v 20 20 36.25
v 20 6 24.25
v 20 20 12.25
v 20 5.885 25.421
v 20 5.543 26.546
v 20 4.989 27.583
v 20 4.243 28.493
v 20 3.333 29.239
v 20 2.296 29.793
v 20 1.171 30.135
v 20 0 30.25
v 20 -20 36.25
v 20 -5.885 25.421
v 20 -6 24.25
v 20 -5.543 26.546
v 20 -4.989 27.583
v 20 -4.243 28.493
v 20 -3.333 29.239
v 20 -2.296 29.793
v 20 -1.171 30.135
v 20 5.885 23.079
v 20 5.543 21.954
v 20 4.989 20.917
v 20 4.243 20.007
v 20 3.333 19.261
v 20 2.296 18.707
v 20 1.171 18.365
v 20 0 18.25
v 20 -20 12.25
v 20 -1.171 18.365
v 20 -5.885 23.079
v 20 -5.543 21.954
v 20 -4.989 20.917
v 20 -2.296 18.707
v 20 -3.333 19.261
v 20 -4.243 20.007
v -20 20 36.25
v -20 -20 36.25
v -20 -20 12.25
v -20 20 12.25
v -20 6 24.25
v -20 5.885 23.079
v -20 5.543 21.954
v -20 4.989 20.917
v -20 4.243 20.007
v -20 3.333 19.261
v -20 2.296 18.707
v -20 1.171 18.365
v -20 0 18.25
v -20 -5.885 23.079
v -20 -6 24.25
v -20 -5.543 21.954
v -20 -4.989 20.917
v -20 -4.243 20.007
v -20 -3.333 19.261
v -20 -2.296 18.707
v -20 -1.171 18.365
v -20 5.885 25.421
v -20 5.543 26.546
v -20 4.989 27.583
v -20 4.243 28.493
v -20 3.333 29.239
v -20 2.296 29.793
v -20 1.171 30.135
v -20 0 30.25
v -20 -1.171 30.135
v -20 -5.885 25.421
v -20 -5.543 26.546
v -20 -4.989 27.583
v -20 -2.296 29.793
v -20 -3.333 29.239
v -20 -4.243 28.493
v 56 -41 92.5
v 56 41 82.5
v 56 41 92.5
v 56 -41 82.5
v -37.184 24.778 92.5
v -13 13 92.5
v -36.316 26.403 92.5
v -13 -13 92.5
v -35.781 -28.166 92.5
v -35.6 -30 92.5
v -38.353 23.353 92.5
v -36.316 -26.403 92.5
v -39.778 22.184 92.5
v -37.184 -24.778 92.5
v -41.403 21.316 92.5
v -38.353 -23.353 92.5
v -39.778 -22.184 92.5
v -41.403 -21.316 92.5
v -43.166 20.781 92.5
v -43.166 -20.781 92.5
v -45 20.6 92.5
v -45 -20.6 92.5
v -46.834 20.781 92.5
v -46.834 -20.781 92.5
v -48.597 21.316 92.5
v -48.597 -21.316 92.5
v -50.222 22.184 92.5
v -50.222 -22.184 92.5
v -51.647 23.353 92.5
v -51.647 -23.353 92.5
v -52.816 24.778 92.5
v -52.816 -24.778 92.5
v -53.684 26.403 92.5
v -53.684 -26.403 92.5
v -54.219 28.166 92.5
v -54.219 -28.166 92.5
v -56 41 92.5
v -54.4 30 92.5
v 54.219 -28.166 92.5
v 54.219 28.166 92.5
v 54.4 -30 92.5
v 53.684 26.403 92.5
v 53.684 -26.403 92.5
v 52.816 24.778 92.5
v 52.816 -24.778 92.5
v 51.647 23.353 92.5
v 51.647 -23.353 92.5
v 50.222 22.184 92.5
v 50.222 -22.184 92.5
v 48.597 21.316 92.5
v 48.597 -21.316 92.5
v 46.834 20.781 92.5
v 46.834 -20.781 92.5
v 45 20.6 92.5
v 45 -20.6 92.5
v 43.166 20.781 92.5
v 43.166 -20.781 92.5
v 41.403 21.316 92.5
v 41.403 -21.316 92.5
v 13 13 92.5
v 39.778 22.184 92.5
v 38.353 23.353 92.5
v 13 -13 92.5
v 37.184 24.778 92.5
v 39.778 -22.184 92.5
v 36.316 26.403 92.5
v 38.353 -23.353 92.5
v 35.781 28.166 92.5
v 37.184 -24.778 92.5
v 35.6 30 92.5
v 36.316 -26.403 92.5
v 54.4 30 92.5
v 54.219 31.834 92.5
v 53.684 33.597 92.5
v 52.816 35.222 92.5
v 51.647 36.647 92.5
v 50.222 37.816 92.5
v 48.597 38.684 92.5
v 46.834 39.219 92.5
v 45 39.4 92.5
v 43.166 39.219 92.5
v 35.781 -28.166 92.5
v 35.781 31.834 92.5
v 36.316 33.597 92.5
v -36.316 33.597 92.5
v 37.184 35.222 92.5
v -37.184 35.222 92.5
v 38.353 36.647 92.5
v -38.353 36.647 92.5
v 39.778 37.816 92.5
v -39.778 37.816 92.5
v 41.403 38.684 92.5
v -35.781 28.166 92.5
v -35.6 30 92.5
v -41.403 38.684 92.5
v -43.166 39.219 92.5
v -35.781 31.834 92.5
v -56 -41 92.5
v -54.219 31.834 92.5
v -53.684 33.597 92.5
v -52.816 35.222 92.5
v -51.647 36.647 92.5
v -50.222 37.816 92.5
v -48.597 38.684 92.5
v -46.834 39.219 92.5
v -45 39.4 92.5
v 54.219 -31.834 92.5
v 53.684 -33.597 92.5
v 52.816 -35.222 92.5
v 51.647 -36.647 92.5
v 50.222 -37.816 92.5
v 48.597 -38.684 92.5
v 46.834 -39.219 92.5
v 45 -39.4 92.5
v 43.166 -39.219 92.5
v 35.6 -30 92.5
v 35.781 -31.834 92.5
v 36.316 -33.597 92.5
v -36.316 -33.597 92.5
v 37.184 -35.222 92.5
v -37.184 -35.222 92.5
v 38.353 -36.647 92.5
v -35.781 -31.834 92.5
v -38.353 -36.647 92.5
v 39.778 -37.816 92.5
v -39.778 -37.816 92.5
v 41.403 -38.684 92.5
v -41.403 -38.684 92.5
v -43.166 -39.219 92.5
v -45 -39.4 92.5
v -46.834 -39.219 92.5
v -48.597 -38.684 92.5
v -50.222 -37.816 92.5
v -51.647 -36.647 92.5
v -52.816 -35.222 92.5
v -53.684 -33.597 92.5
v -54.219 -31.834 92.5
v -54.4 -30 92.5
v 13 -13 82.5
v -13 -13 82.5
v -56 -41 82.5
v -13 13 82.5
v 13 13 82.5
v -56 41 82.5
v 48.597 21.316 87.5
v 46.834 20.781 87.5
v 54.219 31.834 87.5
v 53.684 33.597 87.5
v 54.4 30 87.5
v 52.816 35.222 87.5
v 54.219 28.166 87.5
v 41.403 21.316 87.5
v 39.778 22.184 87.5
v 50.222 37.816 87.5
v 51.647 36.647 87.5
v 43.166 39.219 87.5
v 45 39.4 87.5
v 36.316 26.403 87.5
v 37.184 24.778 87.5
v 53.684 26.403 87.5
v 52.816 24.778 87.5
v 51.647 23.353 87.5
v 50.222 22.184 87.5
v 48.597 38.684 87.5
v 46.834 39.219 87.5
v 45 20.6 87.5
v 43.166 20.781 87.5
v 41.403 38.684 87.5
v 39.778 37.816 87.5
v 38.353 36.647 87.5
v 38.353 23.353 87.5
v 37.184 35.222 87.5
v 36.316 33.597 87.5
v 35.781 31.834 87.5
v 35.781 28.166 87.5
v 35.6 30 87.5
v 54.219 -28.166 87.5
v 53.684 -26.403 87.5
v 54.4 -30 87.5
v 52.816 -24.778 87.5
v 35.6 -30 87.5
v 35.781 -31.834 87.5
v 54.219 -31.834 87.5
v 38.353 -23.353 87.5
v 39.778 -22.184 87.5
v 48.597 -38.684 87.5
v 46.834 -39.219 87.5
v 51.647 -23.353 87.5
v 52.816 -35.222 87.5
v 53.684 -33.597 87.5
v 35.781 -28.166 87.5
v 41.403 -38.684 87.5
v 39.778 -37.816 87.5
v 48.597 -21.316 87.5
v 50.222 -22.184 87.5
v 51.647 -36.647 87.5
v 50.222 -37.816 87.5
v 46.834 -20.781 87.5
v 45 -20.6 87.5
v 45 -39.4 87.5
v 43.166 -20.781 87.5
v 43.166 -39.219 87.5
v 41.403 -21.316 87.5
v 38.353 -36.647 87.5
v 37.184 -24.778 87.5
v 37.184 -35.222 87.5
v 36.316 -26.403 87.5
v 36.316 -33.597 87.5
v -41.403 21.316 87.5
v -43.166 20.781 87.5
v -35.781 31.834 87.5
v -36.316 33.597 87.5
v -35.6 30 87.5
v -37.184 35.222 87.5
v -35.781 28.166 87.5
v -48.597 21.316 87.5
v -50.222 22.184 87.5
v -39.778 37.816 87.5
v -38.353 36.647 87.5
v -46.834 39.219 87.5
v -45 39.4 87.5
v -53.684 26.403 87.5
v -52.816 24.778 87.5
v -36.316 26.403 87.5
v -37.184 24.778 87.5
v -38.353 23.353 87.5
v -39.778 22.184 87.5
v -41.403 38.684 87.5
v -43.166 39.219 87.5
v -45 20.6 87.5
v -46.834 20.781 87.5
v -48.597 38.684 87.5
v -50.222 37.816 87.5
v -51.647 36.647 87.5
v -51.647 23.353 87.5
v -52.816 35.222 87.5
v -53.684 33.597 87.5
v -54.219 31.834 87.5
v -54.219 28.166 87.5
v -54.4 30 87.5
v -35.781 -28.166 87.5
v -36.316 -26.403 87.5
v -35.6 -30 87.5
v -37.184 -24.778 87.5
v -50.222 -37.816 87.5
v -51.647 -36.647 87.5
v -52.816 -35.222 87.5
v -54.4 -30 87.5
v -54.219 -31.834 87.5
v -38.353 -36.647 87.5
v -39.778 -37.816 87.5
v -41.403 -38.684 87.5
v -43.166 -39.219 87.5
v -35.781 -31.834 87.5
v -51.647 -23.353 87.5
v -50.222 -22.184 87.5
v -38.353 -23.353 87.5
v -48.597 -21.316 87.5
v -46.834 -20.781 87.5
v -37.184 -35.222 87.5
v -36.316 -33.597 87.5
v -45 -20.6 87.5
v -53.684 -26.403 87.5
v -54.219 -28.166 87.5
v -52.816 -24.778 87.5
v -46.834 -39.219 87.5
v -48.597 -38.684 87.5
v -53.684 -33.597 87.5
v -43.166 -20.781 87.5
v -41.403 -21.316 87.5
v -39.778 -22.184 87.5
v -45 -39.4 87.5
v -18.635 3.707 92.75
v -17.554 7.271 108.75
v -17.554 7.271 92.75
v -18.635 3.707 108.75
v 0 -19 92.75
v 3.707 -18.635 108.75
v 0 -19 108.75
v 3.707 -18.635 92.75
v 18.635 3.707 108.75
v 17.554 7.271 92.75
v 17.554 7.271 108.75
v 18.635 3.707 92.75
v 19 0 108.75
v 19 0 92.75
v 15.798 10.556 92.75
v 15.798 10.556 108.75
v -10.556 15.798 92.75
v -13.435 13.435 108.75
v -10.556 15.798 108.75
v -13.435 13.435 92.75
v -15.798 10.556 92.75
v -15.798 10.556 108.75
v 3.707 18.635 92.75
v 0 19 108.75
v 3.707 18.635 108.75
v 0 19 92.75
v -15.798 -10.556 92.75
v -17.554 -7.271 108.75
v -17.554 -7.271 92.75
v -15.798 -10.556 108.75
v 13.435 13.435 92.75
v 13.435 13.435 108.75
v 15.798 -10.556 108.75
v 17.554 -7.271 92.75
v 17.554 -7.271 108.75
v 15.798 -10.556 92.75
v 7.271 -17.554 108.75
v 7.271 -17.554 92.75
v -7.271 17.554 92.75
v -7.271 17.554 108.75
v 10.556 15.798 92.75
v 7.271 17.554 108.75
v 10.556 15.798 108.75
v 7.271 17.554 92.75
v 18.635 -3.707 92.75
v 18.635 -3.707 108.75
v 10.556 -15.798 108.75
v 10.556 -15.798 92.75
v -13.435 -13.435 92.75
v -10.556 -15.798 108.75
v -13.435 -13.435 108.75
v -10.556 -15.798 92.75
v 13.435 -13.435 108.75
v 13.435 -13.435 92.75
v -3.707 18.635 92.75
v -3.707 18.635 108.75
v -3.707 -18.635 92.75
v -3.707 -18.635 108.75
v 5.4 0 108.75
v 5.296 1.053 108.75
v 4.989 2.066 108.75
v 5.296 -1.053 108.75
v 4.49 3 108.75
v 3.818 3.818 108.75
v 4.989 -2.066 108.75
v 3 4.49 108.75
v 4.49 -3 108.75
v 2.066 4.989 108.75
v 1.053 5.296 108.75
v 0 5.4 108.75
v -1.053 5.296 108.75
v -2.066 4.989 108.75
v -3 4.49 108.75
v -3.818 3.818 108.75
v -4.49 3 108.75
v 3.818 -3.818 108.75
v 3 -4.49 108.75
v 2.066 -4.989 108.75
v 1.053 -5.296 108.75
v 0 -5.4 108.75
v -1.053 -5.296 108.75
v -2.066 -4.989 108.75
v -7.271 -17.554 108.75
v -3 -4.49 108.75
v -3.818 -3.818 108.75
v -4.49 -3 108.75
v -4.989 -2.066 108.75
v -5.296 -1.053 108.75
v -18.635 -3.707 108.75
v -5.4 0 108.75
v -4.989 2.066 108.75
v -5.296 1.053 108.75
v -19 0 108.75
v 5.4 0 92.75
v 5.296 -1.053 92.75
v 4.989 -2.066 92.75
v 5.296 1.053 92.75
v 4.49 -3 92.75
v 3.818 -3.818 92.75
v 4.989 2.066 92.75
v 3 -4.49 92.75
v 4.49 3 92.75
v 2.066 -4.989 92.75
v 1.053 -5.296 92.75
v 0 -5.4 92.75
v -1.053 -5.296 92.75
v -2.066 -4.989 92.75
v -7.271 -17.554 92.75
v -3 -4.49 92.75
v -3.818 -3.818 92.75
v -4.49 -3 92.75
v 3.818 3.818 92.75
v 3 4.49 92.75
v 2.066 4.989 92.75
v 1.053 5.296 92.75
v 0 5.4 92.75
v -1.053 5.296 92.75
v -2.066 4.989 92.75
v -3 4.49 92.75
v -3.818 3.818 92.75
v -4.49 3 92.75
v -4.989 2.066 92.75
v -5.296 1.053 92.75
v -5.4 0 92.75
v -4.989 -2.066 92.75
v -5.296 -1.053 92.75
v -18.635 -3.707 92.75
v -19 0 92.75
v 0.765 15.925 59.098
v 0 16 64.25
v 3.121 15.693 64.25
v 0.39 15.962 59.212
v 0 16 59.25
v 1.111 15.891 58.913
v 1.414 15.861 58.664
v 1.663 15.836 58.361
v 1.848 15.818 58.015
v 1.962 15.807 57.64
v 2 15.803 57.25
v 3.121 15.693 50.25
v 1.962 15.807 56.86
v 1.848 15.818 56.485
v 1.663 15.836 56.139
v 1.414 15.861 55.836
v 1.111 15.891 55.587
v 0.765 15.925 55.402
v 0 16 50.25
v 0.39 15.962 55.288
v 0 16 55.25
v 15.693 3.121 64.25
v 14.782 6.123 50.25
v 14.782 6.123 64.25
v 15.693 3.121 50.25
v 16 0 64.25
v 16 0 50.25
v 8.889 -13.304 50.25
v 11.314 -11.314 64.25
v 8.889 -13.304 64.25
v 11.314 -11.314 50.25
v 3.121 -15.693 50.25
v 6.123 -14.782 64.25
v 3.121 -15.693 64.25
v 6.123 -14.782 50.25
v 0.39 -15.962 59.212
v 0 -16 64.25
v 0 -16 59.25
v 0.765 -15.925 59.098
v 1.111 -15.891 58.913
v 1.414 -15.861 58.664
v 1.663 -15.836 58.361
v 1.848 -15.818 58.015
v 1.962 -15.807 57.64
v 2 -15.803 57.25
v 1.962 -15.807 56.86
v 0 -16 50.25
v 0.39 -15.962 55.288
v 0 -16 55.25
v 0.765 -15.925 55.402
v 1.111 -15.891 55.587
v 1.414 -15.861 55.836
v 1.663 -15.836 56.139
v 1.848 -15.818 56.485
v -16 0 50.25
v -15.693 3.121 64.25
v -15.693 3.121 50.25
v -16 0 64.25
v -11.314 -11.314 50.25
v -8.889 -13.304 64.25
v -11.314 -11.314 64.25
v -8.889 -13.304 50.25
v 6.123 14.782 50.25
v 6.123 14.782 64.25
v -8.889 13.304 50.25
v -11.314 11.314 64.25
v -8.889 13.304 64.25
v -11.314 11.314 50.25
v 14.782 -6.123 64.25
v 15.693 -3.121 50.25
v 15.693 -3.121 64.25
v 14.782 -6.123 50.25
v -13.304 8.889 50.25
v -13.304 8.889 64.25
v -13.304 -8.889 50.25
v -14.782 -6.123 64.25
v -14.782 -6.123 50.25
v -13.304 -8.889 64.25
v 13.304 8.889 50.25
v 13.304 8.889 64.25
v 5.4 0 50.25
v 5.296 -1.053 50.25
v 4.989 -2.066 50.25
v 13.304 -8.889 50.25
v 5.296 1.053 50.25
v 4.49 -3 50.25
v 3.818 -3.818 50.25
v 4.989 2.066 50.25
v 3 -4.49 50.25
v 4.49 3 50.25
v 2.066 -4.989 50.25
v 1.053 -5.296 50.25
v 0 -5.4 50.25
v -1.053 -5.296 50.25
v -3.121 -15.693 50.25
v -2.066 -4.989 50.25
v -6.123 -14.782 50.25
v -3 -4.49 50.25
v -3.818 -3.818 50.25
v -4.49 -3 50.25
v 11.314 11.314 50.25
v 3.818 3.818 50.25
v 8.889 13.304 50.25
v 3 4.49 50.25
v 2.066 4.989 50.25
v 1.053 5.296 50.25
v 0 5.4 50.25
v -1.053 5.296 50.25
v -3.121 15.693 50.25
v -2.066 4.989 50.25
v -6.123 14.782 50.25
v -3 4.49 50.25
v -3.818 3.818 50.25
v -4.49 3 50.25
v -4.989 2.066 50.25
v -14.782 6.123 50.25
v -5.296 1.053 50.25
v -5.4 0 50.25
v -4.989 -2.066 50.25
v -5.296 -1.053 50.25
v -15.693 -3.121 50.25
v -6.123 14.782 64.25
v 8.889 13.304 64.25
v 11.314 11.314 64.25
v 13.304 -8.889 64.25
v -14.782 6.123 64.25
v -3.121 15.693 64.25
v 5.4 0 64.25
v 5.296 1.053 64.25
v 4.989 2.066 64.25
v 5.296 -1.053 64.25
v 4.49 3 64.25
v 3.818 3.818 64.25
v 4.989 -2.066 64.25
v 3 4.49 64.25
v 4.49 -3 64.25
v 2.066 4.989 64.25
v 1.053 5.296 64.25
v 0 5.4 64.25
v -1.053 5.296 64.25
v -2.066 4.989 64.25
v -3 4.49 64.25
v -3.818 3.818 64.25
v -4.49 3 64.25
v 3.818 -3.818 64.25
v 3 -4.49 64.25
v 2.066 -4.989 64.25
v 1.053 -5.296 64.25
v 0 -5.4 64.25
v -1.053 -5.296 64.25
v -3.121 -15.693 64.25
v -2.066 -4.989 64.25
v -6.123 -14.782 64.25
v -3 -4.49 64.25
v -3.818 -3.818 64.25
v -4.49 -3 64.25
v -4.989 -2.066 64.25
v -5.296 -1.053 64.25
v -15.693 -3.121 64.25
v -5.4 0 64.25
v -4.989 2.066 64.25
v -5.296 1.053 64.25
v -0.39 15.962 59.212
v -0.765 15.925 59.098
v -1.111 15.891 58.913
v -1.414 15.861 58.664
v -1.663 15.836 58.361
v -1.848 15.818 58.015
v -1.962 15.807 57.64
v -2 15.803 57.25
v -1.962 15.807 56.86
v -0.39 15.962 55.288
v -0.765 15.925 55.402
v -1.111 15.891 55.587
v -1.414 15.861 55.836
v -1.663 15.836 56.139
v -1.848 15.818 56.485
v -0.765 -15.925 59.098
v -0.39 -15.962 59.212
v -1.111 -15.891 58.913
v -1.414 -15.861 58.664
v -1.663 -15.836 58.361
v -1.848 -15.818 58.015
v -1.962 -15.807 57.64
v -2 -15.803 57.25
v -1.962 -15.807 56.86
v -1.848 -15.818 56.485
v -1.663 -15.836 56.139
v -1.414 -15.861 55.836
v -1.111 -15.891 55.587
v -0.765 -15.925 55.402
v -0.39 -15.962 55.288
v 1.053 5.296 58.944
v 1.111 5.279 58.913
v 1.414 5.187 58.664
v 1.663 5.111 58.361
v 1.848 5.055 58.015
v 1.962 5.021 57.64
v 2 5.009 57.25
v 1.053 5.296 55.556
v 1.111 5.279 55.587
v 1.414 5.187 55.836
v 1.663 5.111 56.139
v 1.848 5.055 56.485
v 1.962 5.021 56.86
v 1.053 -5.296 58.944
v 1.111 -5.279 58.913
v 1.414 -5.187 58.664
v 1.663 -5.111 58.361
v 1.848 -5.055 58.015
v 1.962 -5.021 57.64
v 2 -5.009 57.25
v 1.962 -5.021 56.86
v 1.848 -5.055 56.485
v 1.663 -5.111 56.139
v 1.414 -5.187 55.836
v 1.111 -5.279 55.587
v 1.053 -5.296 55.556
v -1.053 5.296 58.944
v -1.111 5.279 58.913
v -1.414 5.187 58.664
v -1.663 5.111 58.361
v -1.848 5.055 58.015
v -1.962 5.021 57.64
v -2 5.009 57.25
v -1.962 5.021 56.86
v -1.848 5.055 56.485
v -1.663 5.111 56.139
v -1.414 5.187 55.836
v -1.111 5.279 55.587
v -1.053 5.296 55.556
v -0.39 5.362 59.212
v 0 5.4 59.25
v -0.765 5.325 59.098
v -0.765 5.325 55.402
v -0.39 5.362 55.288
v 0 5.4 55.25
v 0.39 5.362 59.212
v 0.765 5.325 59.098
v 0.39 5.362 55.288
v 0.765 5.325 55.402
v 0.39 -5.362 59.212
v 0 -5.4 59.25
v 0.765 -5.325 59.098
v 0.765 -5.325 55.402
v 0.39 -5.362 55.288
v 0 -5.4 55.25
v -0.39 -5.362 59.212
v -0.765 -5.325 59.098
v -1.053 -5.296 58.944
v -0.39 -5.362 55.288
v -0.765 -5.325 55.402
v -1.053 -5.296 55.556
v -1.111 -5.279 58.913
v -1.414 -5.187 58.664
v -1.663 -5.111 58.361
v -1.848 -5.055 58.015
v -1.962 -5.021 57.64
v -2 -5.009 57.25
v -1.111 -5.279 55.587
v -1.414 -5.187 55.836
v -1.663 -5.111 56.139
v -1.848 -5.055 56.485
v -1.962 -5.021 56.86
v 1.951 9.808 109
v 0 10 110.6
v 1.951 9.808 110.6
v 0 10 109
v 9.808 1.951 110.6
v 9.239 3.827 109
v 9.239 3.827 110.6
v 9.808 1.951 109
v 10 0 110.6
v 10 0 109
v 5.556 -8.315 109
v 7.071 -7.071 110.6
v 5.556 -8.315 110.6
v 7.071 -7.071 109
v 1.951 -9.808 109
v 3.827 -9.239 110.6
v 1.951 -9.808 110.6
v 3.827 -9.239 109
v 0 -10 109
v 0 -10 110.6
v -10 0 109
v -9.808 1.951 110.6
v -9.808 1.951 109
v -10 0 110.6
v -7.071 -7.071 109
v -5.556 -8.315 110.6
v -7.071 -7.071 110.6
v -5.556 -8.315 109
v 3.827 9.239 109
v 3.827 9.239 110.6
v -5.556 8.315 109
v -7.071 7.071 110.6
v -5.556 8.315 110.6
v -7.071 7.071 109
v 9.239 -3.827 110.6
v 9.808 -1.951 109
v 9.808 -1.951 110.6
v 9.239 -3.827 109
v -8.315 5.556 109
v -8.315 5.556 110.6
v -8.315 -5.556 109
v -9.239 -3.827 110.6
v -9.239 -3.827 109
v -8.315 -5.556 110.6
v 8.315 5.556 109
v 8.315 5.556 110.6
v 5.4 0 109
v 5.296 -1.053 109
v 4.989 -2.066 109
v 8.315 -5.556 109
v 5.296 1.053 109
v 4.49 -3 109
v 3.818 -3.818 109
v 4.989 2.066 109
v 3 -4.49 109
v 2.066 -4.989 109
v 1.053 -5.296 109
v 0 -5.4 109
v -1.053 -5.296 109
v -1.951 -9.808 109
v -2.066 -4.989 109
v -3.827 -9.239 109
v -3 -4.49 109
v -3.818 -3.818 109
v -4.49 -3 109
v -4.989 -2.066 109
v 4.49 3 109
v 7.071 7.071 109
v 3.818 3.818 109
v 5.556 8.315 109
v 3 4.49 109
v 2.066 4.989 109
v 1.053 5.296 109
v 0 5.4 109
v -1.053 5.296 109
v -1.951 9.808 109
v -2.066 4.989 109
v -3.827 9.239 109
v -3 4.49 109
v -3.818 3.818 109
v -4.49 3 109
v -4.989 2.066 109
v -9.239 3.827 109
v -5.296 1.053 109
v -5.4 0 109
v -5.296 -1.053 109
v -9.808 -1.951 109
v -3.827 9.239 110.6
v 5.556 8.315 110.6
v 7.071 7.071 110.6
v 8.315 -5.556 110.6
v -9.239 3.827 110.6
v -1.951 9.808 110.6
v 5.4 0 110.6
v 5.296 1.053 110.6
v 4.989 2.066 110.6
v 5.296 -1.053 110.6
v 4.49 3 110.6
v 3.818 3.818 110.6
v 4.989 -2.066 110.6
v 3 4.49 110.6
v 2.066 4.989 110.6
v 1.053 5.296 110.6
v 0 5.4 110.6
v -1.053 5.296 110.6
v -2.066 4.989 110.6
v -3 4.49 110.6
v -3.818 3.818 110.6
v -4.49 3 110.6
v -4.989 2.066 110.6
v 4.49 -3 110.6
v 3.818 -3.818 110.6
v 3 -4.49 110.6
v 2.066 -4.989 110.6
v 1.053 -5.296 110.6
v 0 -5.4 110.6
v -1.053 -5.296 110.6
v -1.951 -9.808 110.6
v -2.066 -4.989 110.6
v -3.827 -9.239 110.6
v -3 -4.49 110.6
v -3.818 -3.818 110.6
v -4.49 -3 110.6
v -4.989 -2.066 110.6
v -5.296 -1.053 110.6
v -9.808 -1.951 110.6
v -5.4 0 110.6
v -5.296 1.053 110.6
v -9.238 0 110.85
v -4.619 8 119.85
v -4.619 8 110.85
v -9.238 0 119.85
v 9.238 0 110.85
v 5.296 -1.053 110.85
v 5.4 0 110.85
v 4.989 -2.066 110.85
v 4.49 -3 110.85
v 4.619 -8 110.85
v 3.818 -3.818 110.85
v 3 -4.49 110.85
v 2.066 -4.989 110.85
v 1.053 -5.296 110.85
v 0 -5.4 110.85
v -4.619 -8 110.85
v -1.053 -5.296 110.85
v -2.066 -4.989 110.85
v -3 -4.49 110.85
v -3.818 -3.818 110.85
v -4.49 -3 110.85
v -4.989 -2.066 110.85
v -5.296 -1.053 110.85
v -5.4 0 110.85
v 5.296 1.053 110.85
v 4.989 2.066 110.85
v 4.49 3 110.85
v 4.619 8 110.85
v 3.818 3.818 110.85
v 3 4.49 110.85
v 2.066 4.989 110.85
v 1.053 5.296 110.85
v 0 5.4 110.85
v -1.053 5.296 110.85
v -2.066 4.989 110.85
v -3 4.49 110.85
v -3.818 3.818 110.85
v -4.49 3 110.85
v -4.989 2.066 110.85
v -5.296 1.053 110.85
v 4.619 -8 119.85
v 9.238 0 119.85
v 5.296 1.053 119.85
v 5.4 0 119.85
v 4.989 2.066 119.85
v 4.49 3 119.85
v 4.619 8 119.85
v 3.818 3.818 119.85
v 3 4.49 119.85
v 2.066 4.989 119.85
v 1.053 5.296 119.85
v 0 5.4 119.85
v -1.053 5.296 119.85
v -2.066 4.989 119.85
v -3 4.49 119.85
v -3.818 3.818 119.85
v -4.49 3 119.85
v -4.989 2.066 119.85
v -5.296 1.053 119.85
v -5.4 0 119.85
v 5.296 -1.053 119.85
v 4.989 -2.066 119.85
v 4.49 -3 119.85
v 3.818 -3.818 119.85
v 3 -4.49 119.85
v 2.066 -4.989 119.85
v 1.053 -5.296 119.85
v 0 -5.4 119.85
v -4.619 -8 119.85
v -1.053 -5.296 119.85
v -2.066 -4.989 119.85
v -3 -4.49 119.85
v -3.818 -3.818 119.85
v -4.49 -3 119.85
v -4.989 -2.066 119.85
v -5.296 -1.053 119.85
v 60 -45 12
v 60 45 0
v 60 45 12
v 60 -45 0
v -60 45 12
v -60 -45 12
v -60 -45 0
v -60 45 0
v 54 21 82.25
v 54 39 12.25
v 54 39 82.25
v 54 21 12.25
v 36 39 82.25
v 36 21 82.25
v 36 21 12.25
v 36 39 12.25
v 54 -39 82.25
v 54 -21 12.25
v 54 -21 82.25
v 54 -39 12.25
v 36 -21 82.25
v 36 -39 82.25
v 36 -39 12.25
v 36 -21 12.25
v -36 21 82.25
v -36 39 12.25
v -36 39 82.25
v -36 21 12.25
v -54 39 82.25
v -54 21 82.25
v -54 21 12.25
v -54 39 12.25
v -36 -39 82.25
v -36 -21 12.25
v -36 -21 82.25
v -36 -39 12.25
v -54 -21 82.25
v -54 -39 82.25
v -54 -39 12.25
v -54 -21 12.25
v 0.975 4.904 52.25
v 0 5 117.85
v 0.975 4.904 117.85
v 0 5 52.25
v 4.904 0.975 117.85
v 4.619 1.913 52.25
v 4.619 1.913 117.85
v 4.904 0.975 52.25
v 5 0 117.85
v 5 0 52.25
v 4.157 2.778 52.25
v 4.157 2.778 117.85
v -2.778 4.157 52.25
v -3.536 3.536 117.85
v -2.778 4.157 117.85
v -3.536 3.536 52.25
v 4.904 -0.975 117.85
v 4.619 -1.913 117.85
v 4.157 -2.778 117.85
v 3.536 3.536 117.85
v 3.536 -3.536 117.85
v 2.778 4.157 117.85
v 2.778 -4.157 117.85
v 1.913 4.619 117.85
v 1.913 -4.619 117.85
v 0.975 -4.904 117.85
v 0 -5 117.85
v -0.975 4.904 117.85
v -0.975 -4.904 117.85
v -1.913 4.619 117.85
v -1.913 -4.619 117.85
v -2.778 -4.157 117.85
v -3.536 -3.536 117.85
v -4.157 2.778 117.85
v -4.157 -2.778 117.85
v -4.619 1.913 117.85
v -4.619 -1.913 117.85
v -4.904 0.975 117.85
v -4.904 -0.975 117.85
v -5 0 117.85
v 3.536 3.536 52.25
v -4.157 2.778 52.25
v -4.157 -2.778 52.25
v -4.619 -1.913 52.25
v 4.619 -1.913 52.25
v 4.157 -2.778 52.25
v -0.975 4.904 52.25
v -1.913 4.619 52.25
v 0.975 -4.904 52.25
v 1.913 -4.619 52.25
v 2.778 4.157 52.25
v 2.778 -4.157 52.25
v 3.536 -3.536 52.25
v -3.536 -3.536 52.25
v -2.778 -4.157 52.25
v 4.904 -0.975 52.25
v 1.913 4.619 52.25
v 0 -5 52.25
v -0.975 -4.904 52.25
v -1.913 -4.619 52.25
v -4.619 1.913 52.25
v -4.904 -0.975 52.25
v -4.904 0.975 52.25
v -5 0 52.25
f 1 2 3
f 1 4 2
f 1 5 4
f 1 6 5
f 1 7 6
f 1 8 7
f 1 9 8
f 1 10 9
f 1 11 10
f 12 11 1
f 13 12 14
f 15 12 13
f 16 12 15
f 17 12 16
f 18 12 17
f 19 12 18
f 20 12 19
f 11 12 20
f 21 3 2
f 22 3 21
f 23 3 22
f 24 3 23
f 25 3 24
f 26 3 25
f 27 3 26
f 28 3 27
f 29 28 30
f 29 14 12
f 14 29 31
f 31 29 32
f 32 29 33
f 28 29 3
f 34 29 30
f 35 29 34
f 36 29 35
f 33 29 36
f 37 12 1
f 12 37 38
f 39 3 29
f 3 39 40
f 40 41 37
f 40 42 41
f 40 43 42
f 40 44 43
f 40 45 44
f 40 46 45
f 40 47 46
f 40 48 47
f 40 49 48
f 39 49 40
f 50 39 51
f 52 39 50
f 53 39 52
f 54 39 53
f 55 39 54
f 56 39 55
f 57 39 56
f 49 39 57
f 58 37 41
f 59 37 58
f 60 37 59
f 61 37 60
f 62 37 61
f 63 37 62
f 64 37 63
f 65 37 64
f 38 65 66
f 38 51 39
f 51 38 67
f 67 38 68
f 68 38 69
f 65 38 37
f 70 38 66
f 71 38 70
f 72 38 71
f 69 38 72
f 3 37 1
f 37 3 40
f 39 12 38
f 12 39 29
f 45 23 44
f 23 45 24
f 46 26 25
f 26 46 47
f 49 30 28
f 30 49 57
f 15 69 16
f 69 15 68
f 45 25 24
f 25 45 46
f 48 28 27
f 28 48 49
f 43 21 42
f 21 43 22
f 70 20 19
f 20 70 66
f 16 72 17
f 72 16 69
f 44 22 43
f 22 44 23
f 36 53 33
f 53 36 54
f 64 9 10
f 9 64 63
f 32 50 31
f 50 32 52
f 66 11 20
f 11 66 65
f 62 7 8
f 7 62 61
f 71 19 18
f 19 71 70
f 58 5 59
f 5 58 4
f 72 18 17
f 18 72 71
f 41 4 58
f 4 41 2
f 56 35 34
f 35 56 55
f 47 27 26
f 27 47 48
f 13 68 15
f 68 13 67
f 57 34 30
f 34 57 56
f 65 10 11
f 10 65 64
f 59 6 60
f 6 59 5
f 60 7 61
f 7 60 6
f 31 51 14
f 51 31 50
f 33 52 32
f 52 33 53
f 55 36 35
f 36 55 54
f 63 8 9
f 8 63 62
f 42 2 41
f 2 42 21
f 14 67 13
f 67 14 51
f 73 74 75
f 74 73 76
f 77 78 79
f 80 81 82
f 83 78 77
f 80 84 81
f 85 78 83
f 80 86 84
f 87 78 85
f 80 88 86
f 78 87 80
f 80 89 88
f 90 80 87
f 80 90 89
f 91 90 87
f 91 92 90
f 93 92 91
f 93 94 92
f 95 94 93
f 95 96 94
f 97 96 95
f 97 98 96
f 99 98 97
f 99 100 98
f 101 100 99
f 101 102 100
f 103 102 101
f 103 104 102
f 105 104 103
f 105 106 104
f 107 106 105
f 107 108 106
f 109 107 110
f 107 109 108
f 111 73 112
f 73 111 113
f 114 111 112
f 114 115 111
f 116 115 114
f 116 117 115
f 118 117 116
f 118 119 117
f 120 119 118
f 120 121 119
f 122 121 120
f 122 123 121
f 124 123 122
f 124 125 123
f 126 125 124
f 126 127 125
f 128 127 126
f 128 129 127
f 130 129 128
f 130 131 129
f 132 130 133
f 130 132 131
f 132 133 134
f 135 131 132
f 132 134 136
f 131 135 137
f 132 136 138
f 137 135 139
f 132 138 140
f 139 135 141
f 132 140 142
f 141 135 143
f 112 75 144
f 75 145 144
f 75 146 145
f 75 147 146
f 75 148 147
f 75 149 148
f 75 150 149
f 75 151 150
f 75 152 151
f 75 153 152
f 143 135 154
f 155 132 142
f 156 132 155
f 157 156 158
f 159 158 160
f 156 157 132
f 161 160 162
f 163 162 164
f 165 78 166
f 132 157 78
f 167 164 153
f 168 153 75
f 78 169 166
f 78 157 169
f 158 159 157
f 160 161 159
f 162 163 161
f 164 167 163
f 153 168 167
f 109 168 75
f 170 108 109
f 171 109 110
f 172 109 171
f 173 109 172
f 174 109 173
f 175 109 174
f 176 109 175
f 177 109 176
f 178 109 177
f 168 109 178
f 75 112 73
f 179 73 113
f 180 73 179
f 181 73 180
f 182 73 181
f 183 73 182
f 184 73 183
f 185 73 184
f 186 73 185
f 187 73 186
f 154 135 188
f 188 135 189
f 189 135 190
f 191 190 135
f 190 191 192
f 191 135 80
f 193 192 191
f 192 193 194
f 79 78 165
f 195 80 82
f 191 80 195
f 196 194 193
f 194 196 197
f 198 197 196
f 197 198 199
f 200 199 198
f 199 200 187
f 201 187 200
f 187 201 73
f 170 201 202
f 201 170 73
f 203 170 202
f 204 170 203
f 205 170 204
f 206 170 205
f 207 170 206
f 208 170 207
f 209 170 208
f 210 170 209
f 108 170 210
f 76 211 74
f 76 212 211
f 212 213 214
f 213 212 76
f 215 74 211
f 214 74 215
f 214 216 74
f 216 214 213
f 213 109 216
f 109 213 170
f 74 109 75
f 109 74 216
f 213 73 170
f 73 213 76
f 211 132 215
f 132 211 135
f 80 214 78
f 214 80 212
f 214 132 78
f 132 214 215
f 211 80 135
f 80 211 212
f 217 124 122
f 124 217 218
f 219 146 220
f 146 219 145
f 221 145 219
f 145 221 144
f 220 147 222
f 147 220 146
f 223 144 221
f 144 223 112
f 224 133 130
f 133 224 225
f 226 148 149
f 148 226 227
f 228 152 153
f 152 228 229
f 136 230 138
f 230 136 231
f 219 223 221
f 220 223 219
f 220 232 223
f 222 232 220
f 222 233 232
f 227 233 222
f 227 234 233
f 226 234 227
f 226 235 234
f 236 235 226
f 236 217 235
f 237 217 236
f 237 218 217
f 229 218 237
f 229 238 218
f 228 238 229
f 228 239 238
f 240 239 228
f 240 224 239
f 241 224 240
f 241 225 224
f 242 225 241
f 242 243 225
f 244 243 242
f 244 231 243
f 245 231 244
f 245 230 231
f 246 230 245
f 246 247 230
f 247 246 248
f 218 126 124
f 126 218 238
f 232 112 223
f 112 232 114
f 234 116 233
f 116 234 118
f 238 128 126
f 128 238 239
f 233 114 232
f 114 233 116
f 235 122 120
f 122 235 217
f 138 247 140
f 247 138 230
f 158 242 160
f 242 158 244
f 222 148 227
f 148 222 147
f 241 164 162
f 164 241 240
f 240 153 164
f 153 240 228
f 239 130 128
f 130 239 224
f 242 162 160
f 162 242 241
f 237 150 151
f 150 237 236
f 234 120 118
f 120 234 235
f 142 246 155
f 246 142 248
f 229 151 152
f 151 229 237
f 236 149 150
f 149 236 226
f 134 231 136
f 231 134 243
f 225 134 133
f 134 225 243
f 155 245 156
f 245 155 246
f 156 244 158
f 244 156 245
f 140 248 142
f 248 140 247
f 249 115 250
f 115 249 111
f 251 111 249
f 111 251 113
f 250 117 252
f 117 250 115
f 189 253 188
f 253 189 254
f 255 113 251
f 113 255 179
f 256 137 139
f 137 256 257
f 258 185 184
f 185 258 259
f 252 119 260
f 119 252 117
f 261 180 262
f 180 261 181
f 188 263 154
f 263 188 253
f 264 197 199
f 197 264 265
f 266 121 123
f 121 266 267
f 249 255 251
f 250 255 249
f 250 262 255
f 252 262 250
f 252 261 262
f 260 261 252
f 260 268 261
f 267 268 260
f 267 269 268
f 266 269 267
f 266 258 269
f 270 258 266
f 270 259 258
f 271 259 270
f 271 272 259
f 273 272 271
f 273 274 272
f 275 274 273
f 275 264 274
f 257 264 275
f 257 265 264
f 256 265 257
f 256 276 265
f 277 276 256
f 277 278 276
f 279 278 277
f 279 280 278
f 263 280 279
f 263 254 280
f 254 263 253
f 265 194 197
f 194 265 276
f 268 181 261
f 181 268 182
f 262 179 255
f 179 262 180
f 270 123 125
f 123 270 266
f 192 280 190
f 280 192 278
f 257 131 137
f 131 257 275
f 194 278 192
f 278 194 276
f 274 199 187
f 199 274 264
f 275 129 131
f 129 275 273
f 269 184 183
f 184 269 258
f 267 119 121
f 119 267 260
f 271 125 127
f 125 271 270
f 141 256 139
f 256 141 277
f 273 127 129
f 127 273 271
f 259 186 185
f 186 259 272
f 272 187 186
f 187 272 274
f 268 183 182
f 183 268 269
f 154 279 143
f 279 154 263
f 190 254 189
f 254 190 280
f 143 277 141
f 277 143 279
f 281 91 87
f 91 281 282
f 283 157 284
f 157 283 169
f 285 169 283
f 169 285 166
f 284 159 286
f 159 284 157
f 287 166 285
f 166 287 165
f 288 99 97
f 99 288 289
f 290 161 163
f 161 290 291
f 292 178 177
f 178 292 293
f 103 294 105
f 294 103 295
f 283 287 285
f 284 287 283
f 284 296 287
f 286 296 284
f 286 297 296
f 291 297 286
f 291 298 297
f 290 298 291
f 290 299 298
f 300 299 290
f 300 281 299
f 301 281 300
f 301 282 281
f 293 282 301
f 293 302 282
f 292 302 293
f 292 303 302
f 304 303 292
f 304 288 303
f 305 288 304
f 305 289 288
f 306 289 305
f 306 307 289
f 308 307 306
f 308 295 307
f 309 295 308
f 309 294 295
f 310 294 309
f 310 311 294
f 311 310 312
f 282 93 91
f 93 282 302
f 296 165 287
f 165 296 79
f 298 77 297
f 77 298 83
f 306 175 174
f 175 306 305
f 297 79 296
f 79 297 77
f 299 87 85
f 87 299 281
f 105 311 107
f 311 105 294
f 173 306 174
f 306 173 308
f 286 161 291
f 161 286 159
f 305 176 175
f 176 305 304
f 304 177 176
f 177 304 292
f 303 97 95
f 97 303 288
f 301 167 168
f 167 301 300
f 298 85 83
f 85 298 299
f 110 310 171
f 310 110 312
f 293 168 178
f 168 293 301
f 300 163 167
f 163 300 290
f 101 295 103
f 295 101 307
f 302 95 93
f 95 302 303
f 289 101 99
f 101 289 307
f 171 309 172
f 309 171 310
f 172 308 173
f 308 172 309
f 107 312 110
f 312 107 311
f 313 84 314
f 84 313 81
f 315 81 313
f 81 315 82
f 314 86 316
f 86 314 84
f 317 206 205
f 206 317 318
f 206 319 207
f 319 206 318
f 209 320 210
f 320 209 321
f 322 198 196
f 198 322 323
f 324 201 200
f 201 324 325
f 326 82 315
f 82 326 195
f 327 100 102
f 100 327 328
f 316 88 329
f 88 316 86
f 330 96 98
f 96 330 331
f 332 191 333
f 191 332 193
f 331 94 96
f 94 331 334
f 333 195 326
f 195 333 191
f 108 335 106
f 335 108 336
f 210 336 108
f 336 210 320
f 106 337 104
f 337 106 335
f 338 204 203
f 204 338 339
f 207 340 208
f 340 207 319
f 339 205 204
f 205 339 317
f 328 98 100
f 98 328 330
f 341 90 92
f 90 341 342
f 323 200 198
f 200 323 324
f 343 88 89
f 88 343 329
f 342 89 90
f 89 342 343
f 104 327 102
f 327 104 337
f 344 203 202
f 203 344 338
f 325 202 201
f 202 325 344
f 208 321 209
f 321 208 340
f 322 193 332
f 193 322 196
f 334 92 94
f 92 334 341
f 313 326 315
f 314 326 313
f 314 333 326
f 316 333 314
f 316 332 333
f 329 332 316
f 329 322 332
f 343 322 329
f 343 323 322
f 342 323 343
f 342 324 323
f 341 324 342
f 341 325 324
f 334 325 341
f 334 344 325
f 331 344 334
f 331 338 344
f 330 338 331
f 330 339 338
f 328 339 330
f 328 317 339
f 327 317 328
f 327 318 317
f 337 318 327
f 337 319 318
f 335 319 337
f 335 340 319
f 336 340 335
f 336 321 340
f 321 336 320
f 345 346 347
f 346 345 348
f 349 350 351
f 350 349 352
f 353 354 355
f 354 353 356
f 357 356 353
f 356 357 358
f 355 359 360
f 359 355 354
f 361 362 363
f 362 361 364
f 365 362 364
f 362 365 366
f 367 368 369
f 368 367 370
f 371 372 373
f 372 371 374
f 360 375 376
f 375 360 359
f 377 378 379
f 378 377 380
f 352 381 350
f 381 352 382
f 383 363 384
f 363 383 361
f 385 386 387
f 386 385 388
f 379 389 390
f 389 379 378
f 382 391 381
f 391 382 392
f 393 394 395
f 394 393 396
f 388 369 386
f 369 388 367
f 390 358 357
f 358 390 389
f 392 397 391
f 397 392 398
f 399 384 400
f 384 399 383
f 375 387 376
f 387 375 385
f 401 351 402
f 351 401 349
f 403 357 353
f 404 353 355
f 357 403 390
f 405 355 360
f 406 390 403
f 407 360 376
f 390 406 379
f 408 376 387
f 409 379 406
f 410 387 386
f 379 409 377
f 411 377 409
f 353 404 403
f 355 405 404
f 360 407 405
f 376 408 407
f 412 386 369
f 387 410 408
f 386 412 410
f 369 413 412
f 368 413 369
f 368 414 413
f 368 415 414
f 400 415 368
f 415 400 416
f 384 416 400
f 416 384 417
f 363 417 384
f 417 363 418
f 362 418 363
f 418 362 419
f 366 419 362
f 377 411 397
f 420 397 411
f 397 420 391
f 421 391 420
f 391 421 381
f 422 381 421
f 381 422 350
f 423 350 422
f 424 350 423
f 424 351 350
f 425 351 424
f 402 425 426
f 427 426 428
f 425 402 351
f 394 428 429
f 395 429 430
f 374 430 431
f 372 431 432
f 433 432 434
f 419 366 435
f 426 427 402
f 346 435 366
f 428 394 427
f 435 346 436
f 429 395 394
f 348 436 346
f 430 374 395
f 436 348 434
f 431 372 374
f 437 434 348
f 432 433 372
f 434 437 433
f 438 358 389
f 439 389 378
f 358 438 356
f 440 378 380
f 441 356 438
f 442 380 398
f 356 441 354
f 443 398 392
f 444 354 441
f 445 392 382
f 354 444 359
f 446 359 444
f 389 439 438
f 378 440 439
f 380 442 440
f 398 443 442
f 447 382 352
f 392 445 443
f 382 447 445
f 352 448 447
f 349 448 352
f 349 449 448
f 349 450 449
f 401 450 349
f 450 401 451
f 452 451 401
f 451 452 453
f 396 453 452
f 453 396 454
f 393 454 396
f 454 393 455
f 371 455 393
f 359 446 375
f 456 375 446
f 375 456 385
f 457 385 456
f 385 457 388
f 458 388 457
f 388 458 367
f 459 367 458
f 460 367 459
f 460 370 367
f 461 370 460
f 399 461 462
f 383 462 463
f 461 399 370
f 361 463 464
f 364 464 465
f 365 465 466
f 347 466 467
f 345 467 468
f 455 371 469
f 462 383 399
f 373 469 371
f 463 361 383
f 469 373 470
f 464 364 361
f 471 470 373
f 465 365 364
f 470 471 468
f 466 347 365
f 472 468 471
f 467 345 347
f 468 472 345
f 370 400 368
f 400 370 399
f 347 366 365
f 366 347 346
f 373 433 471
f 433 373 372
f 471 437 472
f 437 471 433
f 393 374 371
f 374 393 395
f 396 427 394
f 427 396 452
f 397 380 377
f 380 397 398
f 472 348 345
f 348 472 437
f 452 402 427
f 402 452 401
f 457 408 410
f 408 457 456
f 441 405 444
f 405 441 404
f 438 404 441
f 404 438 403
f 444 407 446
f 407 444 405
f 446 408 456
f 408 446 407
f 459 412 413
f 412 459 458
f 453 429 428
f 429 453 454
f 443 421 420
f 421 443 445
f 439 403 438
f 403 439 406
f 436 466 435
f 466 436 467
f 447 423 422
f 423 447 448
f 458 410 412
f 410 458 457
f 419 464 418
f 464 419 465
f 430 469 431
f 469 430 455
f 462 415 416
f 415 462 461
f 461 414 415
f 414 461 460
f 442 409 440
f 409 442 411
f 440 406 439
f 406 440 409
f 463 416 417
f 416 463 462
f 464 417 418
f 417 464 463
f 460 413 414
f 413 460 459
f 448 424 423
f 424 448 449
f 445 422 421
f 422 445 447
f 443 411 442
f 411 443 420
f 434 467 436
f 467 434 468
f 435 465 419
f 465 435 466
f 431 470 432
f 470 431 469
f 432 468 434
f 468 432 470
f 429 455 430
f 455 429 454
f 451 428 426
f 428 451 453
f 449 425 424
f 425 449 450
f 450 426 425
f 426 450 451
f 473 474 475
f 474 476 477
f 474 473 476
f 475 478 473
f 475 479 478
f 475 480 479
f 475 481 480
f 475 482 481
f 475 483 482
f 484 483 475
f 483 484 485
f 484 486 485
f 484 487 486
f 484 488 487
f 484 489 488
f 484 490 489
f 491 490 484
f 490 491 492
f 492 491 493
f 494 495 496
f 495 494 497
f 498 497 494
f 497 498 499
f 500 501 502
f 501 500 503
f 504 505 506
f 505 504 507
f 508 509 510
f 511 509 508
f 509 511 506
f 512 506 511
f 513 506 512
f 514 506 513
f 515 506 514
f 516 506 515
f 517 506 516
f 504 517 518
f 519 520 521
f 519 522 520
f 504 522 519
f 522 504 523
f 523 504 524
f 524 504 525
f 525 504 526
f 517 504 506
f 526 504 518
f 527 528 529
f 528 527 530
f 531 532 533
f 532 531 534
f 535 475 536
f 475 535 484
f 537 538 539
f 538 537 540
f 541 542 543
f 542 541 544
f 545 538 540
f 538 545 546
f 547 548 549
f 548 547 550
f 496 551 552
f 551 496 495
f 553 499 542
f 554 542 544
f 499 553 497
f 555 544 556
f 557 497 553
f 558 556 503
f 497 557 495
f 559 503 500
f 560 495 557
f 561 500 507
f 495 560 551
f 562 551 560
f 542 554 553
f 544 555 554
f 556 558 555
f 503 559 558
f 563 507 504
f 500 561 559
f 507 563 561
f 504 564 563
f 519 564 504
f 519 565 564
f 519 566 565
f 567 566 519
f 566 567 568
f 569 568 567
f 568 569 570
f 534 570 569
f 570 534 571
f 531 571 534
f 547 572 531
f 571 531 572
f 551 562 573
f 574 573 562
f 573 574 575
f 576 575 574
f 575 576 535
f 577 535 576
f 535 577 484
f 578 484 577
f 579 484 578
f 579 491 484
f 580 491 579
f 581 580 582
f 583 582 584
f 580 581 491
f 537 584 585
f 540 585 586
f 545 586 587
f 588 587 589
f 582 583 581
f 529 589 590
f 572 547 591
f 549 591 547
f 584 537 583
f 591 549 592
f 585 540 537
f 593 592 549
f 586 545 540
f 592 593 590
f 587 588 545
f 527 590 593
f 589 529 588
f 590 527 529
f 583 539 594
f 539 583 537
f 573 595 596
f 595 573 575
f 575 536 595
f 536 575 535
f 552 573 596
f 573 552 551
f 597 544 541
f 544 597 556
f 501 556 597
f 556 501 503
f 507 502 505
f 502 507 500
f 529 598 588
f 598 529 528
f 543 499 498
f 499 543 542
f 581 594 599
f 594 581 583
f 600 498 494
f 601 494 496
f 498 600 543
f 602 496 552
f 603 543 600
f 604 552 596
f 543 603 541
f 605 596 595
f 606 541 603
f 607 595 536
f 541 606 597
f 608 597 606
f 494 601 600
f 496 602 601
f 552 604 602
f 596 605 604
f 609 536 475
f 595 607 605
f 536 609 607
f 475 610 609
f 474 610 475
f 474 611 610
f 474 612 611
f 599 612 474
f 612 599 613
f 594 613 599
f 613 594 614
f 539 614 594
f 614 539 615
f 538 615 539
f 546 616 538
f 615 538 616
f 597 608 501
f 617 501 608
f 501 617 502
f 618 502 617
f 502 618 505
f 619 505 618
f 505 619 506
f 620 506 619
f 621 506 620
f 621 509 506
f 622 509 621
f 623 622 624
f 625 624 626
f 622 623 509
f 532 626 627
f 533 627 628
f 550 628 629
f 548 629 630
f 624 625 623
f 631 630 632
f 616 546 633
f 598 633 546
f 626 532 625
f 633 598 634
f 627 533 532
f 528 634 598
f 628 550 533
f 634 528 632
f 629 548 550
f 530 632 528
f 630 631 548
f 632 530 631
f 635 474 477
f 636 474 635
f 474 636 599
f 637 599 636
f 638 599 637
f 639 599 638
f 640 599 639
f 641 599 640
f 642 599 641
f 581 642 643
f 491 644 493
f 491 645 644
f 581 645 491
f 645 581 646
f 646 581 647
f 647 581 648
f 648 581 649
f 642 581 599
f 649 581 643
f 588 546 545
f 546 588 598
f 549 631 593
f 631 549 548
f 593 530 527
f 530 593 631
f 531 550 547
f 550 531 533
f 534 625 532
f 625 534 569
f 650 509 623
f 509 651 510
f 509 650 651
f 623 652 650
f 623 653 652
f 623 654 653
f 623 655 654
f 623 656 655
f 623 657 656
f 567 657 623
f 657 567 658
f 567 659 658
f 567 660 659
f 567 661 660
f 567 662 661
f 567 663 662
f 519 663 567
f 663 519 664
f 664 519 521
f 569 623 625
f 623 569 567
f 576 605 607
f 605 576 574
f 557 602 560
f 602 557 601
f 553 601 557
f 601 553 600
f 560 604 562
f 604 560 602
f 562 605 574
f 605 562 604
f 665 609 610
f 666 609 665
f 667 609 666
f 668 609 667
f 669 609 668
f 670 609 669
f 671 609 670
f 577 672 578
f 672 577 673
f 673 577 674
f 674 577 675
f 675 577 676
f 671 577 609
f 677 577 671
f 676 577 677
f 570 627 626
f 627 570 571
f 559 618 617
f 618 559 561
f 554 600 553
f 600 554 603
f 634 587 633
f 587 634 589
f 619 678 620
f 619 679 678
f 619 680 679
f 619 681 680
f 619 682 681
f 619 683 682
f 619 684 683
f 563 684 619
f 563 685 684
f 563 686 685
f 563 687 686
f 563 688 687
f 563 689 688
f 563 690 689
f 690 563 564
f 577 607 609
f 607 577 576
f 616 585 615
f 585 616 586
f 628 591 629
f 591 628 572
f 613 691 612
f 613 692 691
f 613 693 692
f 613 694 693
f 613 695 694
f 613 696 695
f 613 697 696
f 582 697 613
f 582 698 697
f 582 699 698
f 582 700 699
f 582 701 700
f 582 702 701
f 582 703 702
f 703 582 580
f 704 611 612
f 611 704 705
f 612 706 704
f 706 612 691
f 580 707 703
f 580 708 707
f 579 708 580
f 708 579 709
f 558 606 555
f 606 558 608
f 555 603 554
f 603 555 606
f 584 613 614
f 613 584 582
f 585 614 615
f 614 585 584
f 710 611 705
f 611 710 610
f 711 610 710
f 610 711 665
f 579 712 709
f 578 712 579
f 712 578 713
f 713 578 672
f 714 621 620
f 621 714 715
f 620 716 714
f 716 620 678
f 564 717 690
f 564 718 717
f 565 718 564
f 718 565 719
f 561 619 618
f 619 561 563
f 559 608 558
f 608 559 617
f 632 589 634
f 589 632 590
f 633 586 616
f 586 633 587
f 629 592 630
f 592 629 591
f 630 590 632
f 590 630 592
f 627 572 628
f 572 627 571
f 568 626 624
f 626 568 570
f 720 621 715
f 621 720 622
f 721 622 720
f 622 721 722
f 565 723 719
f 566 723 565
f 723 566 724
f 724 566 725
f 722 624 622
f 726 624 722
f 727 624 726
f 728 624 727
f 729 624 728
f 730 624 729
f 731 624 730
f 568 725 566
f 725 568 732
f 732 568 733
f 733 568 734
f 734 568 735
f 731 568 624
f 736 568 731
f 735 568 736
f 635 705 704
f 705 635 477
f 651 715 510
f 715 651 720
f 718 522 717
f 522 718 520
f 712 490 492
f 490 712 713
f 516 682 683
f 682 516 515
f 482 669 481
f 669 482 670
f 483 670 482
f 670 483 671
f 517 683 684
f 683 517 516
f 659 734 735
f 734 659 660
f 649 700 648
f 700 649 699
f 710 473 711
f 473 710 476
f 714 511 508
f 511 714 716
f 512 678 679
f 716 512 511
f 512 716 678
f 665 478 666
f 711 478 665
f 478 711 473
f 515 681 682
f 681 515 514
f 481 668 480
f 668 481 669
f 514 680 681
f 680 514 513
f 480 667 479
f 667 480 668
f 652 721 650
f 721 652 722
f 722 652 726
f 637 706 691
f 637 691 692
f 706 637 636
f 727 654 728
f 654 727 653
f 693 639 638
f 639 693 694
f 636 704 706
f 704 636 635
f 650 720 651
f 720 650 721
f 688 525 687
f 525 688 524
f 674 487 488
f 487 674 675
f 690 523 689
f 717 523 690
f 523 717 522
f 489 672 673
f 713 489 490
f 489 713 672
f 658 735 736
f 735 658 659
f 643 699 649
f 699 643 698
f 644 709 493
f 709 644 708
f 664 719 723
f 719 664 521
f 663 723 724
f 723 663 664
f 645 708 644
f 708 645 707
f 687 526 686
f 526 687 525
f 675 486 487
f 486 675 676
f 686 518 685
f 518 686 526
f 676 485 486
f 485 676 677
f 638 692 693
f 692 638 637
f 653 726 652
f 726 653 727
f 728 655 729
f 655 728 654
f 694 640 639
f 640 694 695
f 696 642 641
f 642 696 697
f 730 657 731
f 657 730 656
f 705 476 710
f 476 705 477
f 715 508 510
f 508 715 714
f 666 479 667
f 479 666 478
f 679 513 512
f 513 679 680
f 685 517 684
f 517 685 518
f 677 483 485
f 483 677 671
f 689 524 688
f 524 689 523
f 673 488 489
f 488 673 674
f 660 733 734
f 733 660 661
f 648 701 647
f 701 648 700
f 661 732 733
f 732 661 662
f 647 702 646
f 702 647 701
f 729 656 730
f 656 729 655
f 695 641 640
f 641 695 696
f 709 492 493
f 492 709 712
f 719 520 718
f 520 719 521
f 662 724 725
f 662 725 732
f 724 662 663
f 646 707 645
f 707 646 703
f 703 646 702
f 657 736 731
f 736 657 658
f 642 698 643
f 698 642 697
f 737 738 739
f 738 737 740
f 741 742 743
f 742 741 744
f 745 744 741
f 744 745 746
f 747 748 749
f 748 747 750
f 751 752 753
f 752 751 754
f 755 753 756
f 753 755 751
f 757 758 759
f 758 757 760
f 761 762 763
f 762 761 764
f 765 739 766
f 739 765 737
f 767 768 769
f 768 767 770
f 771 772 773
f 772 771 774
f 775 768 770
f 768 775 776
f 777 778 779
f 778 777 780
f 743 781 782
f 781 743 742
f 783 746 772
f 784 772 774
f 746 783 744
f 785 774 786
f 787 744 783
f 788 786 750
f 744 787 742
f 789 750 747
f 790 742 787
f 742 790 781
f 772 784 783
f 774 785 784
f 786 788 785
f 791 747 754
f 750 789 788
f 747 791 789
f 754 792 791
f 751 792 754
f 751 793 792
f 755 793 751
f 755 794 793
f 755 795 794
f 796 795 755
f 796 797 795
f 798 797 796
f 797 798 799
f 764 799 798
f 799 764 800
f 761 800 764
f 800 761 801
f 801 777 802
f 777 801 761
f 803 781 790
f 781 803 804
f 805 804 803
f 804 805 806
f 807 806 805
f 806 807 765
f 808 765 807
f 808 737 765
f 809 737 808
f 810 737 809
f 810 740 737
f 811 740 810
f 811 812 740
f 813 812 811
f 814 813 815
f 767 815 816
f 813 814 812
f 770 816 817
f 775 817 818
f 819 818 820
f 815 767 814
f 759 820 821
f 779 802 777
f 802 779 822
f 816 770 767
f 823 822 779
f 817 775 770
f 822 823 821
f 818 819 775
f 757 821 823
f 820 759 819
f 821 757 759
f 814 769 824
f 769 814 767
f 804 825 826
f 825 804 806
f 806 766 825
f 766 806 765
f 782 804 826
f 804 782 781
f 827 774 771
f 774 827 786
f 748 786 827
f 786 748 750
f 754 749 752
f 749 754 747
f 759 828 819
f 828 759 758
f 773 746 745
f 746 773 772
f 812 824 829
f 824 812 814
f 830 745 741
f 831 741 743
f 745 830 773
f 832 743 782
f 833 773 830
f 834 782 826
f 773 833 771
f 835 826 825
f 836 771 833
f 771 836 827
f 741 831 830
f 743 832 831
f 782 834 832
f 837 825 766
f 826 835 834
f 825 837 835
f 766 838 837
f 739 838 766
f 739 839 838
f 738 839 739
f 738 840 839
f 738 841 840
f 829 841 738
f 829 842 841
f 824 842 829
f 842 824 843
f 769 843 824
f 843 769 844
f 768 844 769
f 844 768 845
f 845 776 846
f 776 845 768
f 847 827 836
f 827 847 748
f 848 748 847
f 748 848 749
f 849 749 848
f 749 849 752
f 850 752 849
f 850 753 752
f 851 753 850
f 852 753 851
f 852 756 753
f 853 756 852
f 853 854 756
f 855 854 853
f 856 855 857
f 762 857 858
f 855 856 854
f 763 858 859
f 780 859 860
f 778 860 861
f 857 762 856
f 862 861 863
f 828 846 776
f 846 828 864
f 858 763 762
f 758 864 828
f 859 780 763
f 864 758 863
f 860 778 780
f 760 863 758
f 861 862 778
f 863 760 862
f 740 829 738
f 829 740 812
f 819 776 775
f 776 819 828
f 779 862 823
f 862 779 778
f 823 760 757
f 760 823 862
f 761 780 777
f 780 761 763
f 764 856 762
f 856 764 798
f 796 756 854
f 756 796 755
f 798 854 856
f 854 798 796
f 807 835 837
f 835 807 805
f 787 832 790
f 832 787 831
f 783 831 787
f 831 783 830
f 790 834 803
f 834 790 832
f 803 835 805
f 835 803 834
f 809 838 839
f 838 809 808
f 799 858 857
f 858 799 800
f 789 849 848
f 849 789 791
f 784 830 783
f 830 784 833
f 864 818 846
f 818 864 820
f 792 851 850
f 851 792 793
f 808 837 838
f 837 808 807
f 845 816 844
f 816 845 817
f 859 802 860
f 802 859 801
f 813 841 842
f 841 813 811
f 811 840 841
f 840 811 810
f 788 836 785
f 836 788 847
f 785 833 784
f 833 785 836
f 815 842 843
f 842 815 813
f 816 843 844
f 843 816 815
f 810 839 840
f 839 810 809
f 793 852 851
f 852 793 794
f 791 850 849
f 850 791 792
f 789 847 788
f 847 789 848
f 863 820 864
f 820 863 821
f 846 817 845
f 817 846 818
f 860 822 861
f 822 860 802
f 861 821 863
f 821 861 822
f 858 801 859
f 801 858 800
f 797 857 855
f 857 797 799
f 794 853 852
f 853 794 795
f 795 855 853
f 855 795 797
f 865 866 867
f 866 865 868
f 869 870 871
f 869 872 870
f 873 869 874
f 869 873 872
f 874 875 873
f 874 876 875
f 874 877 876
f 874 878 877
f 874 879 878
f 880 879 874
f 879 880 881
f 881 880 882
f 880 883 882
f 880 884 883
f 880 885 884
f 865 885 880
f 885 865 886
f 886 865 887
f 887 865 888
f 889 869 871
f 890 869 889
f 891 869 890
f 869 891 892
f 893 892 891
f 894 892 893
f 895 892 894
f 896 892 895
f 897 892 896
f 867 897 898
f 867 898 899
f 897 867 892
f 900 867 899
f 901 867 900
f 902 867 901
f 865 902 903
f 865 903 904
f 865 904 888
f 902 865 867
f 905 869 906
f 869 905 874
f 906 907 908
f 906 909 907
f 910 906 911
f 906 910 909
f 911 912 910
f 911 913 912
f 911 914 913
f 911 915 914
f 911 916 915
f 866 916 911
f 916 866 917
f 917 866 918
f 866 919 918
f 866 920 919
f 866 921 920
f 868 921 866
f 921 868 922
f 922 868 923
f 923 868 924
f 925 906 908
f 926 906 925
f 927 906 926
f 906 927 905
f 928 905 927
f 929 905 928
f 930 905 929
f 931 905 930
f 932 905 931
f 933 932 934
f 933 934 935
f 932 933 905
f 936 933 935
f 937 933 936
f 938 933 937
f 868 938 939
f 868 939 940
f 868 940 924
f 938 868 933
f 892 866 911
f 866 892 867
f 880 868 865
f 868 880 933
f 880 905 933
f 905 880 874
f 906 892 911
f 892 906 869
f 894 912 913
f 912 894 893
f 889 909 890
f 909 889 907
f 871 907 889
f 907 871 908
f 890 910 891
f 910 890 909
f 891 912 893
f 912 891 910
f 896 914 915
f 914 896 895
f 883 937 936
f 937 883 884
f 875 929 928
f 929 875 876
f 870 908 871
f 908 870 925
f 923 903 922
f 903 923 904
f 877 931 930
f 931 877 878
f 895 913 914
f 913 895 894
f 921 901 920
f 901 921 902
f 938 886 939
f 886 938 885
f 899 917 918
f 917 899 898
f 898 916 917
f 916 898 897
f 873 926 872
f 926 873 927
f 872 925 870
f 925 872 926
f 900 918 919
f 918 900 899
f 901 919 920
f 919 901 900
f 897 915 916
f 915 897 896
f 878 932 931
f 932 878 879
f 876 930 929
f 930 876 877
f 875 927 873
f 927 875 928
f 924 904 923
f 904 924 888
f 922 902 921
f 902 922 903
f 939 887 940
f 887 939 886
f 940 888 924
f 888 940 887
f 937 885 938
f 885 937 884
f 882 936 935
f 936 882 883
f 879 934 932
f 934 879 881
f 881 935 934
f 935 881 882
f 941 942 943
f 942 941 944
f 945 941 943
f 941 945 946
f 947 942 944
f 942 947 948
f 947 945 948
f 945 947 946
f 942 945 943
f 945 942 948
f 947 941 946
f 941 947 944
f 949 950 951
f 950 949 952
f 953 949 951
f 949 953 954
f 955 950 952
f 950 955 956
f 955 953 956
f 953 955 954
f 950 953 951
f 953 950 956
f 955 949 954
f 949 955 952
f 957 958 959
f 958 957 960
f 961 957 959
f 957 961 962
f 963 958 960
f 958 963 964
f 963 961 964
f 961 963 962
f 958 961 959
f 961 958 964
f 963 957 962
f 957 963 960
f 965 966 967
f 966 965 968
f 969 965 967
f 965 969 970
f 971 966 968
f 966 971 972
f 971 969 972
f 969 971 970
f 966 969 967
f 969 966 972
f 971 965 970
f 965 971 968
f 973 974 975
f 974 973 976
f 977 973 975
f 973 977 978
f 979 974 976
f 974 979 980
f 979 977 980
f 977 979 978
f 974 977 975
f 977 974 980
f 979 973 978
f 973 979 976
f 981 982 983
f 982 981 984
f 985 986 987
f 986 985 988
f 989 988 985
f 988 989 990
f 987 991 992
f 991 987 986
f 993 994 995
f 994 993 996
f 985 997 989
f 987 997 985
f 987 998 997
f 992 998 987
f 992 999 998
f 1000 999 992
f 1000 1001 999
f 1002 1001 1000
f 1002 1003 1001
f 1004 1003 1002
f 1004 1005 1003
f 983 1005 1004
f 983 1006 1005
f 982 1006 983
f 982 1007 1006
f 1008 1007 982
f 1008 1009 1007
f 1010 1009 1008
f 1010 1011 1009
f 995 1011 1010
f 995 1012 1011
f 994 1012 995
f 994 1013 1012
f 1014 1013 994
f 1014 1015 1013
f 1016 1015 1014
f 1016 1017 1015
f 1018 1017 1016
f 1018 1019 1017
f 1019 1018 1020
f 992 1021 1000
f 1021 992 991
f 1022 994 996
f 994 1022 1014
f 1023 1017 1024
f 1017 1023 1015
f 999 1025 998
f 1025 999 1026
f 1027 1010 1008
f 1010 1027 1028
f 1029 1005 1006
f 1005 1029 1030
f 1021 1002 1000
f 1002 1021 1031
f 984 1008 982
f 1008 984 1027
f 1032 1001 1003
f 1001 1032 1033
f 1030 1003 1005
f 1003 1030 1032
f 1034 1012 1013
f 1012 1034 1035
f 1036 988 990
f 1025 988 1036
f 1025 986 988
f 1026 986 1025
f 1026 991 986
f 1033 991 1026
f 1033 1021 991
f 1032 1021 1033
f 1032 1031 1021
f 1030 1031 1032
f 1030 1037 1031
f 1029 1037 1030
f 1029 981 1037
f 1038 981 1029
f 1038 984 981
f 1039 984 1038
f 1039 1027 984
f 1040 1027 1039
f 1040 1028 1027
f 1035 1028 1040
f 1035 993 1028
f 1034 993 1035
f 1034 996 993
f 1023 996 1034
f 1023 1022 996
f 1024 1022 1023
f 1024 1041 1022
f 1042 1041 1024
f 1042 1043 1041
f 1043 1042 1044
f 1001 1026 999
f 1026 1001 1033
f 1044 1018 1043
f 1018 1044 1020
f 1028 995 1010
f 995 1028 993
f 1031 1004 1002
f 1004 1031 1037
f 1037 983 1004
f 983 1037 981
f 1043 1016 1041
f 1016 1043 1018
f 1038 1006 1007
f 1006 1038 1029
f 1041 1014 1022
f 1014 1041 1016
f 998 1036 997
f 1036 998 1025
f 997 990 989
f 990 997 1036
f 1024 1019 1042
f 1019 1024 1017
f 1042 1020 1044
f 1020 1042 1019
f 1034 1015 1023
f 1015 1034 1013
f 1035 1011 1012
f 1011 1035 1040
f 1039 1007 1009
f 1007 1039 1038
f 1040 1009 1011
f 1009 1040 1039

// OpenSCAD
$fn = 32;

// ------------------------------------------------------------------------
// Arbor press fixture: screw d10, posts 70 mm, gap 14 mm
// Every part is its own module, assembly() places every instance.
// ------------------------------------------------------------------------

// --- part 1 ---
module press_bed() {
  difference() {
    translate([-60, -45, 0]) cube([120, 90, 12]);
  }
}

// --- part 2 ---
module anvil_block() {
  difference() {
    translate([-20, -20, 0]) cube([40, 40, 24]);
    translate([0, 0, 12]) rotate([0, 90, 0]) cylinder(h = 42, d = 12, center = true);
  }
}

// --- part 3 ---
module press_post_a() {
  translate([-9, -9, 0]) cube([18, 18, 70]);
}

// --- part 4 ---
module press_post_b() {
  translate([-9, -9, 0]) cube([18, 18, 70]);
}

// --- part 5 ---
module press_post_c() {
  translate([-9, -9, 0]) cube([18, 18, 70]);
}

// --- part 6 ---
module press_post_d() {
  translate([-9, -9, 0]) cube([18, 18, 70]);
}

// --- part 7 ---
module press_frame() {
  difference() {
    translate([-56, -41, 0]) cube([112, 82, 10]);
    translate([-13, -13, -1]) cube([26, 26, 12]);
    translate([45, 30, 5]) cylinder(h = 6, d = 18.8);
    translate([45, -30, 5]) cylinder(h = 6, d = 18.8);
    translate([-45, 30, 5]) cylinder(h = 6, d = 18.8);
    translate([-45, -30, 5]) cylinder(h = 6, d = 18.8);
  }
}

// --- part 8 ---
module guide_ring() {
  difference() {
      translate([0, 0, 0]) cylinder(h = 16, d = 38);
      translate([0, 0, -1]) cylinder(h = 18, d = 10.8);
    }
}

// --- part 9 ---
module press_screw() {
  translate([0, 0, -32.8]) cylinder(h = 65.6, d = 10);
}

// --- part 10 ---
module press_head() {
  difference() {
    cylinder(h = 14, d = 32);
    translate([0, 0, -1]) cylinder(h = 16, d = 10.8);
    translate([0, 0, 7]) rotate([90, 0, 0]) cylinder(h = 34, d = 4, center = true);
  }
}

// --- part 11 ---
module nut_washer() {
  difference() {
      translate([0, 0, 0]) cylinder(h = 1.6, d = 20);
      translate([0, 0, -1]) cylinder(h = 3.6, d = 10.8);
    }
}

// --- part 12 ---
module press_nut() {
  difference() {
    linear_extrude(height = 9) polygon(points = [[9.238, 0], [4.619, 8], [-4.619, 8], [-9.238, 0], [-4.619, -8], [4.619, -8]]);
    translate([0, 0, -1]) cylinder(h = 11, d = 10.8);
  }
}

// --- assembly ---
module assembly() {
  color([0.80, 0.24, 0.20]) translate([0, 0, 0]) rotate([0, 0, 0]) press_bed();
  color([0.20, 0.45, 0.75]) translate([0, 0, 12.25]) rotate([0, 0, 0]) anvil_block();
  color([0.25, 0.62, 0.32]) translate([45, 30, 12.25]) rotate([0, 0, 0]) press_post_a();
  color([0.92, 0.70, 0.18]) translate([45, -30, 12.25]) rotate([0, 0, 0]) press_post_b();
  color([0.58, 0.35, 0.70]) translate([-45, 30, 12.25]) rotate([0, 0, 0]) press_post_c();
  color([0.16, 0.66, 0.66]) translate([-45, -30, 12.25]) rotate([0, 0, 0]) press_post_d();
  color([0.85, 0.48, 0.18]) translate([0, 0, 82.5]) rotate([0, 0, 0]) press_frame();
  color([0.55, 0.60, 0.65]) translate([0, 0, 92.75]) rotate([0, 0, 0]) guide_ring();
  color([0.75, 0.30, 0.55]) translate([0, 0, 85.05]) rotate([0, 0, 0]) press_screw();
  color([0.42, 0.52, 0.28]) translate([0, 0, 50.25]) rotate([0, 0, 0]) press_head();
  color([0.80, 0.24, 0.20]) translate([0, 0, 109]) rotate([0, 0, 0]) nut_washer();
  color([0.20, 0.45, 0.75]) translate([0, 0, 110.85]) rotate([0, 0, 0]) press_nut();
}

assembly();
